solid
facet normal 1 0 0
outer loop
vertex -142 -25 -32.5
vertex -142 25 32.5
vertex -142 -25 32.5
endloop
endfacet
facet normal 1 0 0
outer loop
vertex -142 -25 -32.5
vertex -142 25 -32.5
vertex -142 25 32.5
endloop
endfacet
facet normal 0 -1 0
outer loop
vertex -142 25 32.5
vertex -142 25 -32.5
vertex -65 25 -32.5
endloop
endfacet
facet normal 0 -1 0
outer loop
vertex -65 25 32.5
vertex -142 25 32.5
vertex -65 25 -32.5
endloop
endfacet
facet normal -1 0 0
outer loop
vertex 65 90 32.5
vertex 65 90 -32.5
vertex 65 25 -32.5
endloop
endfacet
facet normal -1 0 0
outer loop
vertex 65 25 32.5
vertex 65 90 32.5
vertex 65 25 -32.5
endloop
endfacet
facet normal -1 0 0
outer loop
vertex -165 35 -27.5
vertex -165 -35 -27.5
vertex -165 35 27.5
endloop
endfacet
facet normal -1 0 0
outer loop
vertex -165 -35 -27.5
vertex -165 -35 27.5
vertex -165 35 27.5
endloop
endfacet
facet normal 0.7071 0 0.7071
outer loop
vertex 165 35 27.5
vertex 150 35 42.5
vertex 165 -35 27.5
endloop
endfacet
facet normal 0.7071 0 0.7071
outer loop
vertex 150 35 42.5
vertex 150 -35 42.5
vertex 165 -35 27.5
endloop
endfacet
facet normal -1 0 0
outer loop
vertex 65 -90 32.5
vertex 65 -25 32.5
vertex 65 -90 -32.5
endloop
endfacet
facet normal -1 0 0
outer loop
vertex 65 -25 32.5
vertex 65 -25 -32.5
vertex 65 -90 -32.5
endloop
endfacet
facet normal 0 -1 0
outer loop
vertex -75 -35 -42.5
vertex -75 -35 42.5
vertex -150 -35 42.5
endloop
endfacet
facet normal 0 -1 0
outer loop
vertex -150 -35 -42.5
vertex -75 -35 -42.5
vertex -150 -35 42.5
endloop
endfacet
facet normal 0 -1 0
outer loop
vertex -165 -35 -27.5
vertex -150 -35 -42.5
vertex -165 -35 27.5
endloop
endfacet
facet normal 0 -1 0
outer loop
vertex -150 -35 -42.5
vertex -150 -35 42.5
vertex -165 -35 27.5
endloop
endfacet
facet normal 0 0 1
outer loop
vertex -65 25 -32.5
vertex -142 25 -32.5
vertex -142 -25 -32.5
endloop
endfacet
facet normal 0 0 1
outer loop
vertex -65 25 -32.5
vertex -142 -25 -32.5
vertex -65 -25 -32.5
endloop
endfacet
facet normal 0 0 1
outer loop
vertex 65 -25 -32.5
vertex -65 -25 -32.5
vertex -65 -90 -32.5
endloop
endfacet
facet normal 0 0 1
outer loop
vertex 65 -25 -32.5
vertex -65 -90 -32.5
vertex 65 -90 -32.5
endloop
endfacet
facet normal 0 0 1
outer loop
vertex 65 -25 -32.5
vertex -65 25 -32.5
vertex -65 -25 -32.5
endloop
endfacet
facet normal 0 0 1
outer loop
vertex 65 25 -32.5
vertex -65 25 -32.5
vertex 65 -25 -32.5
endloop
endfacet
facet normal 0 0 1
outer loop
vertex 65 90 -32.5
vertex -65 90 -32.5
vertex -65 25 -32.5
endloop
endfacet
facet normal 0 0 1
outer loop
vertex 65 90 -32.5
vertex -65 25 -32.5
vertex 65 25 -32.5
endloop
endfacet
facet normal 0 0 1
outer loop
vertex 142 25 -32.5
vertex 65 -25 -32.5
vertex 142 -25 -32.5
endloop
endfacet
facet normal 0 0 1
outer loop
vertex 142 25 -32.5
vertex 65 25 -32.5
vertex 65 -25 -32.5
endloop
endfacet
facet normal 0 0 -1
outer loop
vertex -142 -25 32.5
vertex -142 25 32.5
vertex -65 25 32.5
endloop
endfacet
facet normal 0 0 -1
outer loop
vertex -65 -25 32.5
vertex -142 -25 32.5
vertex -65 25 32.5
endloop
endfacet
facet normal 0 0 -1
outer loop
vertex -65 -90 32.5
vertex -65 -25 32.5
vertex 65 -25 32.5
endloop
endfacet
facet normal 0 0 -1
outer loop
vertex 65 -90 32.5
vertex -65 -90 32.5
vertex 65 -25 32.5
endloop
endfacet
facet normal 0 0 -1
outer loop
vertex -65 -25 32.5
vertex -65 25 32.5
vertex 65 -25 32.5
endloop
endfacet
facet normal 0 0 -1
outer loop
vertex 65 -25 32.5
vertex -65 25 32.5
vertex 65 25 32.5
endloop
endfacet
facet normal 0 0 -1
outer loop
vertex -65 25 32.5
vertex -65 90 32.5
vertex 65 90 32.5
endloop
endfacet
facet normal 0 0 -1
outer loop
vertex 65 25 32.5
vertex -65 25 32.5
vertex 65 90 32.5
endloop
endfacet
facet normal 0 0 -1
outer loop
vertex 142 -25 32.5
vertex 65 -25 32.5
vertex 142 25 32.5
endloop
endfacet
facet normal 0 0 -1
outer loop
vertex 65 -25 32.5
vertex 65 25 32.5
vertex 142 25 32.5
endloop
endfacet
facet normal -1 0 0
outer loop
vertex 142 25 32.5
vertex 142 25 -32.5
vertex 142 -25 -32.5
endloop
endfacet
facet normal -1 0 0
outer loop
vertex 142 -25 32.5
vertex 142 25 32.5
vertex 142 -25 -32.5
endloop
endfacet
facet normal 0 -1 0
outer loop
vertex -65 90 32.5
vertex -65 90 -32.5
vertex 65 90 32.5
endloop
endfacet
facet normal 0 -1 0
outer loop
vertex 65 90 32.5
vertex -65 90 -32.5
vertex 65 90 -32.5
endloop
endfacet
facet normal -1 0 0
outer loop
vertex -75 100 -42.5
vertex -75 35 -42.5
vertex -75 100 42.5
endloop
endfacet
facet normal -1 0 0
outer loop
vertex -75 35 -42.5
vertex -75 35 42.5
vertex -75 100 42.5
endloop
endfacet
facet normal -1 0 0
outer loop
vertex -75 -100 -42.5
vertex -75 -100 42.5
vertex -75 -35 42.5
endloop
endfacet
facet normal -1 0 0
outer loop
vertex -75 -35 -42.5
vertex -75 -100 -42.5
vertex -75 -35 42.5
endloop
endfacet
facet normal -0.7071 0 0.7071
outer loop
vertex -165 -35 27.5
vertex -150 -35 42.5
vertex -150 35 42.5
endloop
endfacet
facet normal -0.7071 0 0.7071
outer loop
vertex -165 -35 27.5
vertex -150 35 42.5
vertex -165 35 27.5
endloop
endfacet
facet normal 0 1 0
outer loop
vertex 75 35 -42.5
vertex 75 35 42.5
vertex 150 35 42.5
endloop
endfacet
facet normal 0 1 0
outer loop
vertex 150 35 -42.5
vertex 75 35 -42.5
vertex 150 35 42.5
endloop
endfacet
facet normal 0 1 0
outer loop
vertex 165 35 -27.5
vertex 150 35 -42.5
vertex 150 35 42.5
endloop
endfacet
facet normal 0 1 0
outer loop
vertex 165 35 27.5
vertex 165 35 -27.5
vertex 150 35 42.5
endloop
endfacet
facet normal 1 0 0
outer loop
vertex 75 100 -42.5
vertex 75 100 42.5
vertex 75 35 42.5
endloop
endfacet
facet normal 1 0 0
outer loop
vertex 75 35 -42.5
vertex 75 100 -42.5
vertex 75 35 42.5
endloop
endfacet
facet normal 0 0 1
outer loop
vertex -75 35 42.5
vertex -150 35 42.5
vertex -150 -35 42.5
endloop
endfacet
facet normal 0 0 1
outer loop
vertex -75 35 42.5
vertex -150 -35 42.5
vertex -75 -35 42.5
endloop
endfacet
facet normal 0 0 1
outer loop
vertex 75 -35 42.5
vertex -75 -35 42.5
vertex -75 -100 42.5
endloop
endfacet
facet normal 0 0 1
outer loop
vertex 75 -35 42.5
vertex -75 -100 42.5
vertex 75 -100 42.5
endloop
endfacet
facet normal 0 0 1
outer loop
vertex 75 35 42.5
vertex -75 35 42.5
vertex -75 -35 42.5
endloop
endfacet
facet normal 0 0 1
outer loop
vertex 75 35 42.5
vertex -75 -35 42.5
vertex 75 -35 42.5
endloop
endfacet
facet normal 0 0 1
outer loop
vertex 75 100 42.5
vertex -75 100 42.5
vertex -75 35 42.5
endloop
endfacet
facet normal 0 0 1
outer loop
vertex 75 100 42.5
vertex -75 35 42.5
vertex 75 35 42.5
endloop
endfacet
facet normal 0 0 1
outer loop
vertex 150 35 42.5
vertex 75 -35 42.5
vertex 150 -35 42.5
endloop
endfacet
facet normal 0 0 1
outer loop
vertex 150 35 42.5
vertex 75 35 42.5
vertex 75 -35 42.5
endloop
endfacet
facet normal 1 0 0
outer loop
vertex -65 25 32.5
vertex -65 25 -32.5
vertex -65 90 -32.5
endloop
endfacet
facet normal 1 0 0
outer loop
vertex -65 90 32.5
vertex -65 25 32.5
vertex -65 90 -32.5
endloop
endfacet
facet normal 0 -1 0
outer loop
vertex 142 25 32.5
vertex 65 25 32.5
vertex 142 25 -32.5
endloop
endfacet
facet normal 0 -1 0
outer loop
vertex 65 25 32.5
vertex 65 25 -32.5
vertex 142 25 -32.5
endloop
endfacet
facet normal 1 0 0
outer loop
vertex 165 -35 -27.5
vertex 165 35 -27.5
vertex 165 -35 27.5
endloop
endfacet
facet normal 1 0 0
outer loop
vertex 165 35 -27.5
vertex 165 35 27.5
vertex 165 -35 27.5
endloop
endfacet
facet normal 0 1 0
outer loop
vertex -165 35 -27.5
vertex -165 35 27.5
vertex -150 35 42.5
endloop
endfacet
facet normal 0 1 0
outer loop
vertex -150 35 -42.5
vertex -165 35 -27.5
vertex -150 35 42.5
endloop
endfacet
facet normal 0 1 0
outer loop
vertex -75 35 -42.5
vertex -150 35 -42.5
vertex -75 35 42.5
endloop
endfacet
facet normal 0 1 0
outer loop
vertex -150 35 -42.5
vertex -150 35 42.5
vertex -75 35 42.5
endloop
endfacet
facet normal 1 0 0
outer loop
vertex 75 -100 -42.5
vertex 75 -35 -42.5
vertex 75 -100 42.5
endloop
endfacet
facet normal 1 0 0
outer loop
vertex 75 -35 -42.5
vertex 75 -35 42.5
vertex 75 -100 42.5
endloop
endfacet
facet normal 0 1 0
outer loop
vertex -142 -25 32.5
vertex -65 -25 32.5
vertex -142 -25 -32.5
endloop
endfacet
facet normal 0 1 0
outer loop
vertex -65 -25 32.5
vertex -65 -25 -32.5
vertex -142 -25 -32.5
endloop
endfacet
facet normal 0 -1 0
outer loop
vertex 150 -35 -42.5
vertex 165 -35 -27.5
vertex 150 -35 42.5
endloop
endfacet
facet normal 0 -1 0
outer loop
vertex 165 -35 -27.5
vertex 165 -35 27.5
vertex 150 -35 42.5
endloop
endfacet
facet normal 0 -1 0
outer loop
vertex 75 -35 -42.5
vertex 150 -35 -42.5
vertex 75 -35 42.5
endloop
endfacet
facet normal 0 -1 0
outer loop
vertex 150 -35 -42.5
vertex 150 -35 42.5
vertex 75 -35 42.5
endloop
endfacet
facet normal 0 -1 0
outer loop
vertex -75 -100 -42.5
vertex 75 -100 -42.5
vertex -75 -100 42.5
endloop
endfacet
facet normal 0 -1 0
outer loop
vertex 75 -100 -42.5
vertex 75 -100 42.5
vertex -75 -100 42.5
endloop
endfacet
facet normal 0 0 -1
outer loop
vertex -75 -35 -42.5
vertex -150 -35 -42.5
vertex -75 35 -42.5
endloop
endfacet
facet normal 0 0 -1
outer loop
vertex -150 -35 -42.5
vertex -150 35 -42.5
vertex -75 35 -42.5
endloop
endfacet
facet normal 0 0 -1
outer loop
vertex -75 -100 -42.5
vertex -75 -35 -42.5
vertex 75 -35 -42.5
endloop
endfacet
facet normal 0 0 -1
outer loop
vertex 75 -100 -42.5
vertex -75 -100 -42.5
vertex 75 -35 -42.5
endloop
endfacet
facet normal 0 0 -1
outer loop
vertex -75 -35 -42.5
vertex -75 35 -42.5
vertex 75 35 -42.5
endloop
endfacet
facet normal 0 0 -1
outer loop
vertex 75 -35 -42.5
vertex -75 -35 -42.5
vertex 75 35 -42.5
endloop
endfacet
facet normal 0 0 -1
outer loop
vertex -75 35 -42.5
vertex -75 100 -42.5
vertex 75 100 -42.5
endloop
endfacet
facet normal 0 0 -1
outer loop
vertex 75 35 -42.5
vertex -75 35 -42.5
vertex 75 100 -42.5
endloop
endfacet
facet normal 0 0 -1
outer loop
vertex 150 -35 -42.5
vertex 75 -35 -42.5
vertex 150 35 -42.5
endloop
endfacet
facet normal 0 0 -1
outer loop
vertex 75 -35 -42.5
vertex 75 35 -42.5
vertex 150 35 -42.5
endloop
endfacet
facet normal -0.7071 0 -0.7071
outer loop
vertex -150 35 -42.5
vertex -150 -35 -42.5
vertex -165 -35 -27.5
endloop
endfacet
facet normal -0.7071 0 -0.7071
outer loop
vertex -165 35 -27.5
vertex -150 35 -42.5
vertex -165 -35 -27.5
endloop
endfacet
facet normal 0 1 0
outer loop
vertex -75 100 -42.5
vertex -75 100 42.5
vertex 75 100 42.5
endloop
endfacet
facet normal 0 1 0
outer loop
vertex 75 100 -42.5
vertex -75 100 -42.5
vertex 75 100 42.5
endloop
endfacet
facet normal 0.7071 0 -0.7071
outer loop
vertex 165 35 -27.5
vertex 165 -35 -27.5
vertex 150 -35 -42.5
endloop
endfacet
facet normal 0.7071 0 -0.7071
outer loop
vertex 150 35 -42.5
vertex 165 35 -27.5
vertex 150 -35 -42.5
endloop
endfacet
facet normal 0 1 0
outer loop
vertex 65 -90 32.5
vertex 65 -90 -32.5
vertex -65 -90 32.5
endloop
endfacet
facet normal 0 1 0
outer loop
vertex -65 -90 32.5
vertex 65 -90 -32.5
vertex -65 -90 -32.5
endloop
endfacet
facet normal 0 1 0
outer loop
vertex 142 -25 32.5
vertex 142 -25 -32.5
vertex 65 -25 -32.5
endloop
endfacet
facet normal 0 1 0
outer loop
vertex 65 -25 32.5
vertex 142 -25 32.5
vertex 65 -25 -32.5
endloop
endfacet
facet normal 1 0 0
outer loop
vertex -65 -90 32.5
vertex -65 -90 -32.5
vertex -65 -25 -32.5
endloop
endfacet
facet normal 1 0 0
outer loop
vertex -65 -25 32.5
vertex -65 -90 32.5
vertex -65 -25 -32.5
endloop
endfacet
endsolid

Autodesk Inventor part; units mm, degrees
ref_plane "YZ Plane" through (0, 0, 0) normal (1, 0, 0) x (0, 1, 0)
ref_plane "XZ Plane" through (0, 0, 0) normal (0, 1, 0) x (-1, 0, 0)
ref_plane "XY Plane" through (0, 0, 0) normal (0, 0, 1) x (1, 0, 0)
sketch "Sketch1" plane through (0, 0, 0) normal (0, 0, 1) x (1, 0, 0)
  line L0 (75, -100) -> (-75, -100)
  line L1 (-75, 100) -> (75, 100)
  line L2 (75, -100) -> (-75, 100) construction
  line L3 (-75, -100) -> (75, 100) construction
  line L4 (-165, -35) -> (-165, 35)
  line L5 (165, 35) -> (165, -35)
  line L6 (165, -35) -> (-165, 35) construction
  line L7 (-165, -35) -> (165, 35) construction
  line L8 (-75, -100) -> (-75, -35)
  line L9 (-75, 35) -> (-75, 100)
  line L10 (-165, 35) -> (-75, 35)
  line L11 (75, 35) -> (165, 35)
  line L12 (75, 100) -> (75, 35)
  line L13 (75, -35) -> (75, -100)
  line L14 (165, -35) -> (75, -35)
  line L15 (-75, -35) -> (-165, -35)
  line L16 (-65, 90) -> (65, 90)
  line L17 (65, 90) -> (65, 25)
  line L18 (65, 25) -> (155, 25)
  line L19 (155, 25) -> (155, -25)
  line L20 (155, -25) -> (65, -25)
  line L21 (65, -25) -> (65, -90)
  line L22 (65, -90) -> (-65, -90)
  line L23 (-65, -90) -> (-65, -25)
  line L24 (-65, -25) -> (-155, -25)
  line L25 (-155, -25) -> (-155, 25)
  line L26 (-155, 25) -> (-65, 25)
  line L27 (-65, 25) -> (-65, 90)
  line L28 (-142, 25) -> (-142, -25)
  line L29 (142, 25) -> (142, -25)
  point P0 (0, 0)
  point P1 (0, 0)
  point P2 (0, 0)
  point P3 (0, 0)
  point P4 (0, 0)
  dimension "d0" = 70
  dimension "d1" = 330
  dimension "d2" = 150
  dimension "d3" = 200
  dimension "d10" = 10
  dimension "d11" = 23
  dimension "d12" = 23
extrude "Extrusion1" add sketch "Sketch1" along normal mid plane 85 contours L0 L8 L15 L4 L10 L9 L1 L12 L11 L5 L14 L13 | L16 L17 L18 L29 L20 L21 L22 L23 L24 L28 L26 L27 | L28 L24 L25 L26 | L18 L19 L20 L29
sketch "Sketch2" plane through (0, 0, 0) normal (0, 1, 0) x (-1, 0, 0)
  line L0 (-150, 42.5) -> (-165, 27.5)
  line L1 (-165, -42.5) -> (-165, 42.5) projected
  line L2 (-165, -27.5) -> (-150, -42.5)
  line L3 (-165, -42.5) -> (-75, -42.5) projected
  line L4 (75, 42.5) -> (165, 42.5) projected
  line L5 (150, 42.5) -> (165, 27.5)
  line L6 (165, -42.5) -> (165, 42.5) projected
  line L7 (-165, -42.5) -> (165, -42.5) projected
  line L8 (150, -42.5) -> (165, -27.5)
  line L9 (-165, 42.5) -> (165, 42.5) projected
  line L10 (165, 0) -> (-165, 0) construction
  line L11 (-165, 42.5) -> (-165, -42.5) construction
  line L12 (-75, 42.5) -> (75, 42.5) construction
  line L13 (0, 42.5) -> (0, -42.5) construction
  line L14 (75, -42.5) -> (-75, -42.5) construction
  point P0 (0, 0)
  dimension "d6" = 15
  dimension "d7" = 45
extrude "Extrusion2" cut sketch "Sketch2" along normal through all both and the other way through all contours L0 L1 L9 | L2 L3 L1 | L4 L6 L5 | L6 L7 L8
extrude "Extrusion3" cut sketch "Sketch1" along normal mid plane 65 contours L16 L17 L18 L29 L20 L21 L22 L23 L24 L28 L26 L27
equation "\"d10\" = wall_thickness"
equation "\"d13\" = body_thickness - 2 * wall_thickness"
equation "\"wall_thickness\" = 10"
equation "\"body_thickness\" = 85"
